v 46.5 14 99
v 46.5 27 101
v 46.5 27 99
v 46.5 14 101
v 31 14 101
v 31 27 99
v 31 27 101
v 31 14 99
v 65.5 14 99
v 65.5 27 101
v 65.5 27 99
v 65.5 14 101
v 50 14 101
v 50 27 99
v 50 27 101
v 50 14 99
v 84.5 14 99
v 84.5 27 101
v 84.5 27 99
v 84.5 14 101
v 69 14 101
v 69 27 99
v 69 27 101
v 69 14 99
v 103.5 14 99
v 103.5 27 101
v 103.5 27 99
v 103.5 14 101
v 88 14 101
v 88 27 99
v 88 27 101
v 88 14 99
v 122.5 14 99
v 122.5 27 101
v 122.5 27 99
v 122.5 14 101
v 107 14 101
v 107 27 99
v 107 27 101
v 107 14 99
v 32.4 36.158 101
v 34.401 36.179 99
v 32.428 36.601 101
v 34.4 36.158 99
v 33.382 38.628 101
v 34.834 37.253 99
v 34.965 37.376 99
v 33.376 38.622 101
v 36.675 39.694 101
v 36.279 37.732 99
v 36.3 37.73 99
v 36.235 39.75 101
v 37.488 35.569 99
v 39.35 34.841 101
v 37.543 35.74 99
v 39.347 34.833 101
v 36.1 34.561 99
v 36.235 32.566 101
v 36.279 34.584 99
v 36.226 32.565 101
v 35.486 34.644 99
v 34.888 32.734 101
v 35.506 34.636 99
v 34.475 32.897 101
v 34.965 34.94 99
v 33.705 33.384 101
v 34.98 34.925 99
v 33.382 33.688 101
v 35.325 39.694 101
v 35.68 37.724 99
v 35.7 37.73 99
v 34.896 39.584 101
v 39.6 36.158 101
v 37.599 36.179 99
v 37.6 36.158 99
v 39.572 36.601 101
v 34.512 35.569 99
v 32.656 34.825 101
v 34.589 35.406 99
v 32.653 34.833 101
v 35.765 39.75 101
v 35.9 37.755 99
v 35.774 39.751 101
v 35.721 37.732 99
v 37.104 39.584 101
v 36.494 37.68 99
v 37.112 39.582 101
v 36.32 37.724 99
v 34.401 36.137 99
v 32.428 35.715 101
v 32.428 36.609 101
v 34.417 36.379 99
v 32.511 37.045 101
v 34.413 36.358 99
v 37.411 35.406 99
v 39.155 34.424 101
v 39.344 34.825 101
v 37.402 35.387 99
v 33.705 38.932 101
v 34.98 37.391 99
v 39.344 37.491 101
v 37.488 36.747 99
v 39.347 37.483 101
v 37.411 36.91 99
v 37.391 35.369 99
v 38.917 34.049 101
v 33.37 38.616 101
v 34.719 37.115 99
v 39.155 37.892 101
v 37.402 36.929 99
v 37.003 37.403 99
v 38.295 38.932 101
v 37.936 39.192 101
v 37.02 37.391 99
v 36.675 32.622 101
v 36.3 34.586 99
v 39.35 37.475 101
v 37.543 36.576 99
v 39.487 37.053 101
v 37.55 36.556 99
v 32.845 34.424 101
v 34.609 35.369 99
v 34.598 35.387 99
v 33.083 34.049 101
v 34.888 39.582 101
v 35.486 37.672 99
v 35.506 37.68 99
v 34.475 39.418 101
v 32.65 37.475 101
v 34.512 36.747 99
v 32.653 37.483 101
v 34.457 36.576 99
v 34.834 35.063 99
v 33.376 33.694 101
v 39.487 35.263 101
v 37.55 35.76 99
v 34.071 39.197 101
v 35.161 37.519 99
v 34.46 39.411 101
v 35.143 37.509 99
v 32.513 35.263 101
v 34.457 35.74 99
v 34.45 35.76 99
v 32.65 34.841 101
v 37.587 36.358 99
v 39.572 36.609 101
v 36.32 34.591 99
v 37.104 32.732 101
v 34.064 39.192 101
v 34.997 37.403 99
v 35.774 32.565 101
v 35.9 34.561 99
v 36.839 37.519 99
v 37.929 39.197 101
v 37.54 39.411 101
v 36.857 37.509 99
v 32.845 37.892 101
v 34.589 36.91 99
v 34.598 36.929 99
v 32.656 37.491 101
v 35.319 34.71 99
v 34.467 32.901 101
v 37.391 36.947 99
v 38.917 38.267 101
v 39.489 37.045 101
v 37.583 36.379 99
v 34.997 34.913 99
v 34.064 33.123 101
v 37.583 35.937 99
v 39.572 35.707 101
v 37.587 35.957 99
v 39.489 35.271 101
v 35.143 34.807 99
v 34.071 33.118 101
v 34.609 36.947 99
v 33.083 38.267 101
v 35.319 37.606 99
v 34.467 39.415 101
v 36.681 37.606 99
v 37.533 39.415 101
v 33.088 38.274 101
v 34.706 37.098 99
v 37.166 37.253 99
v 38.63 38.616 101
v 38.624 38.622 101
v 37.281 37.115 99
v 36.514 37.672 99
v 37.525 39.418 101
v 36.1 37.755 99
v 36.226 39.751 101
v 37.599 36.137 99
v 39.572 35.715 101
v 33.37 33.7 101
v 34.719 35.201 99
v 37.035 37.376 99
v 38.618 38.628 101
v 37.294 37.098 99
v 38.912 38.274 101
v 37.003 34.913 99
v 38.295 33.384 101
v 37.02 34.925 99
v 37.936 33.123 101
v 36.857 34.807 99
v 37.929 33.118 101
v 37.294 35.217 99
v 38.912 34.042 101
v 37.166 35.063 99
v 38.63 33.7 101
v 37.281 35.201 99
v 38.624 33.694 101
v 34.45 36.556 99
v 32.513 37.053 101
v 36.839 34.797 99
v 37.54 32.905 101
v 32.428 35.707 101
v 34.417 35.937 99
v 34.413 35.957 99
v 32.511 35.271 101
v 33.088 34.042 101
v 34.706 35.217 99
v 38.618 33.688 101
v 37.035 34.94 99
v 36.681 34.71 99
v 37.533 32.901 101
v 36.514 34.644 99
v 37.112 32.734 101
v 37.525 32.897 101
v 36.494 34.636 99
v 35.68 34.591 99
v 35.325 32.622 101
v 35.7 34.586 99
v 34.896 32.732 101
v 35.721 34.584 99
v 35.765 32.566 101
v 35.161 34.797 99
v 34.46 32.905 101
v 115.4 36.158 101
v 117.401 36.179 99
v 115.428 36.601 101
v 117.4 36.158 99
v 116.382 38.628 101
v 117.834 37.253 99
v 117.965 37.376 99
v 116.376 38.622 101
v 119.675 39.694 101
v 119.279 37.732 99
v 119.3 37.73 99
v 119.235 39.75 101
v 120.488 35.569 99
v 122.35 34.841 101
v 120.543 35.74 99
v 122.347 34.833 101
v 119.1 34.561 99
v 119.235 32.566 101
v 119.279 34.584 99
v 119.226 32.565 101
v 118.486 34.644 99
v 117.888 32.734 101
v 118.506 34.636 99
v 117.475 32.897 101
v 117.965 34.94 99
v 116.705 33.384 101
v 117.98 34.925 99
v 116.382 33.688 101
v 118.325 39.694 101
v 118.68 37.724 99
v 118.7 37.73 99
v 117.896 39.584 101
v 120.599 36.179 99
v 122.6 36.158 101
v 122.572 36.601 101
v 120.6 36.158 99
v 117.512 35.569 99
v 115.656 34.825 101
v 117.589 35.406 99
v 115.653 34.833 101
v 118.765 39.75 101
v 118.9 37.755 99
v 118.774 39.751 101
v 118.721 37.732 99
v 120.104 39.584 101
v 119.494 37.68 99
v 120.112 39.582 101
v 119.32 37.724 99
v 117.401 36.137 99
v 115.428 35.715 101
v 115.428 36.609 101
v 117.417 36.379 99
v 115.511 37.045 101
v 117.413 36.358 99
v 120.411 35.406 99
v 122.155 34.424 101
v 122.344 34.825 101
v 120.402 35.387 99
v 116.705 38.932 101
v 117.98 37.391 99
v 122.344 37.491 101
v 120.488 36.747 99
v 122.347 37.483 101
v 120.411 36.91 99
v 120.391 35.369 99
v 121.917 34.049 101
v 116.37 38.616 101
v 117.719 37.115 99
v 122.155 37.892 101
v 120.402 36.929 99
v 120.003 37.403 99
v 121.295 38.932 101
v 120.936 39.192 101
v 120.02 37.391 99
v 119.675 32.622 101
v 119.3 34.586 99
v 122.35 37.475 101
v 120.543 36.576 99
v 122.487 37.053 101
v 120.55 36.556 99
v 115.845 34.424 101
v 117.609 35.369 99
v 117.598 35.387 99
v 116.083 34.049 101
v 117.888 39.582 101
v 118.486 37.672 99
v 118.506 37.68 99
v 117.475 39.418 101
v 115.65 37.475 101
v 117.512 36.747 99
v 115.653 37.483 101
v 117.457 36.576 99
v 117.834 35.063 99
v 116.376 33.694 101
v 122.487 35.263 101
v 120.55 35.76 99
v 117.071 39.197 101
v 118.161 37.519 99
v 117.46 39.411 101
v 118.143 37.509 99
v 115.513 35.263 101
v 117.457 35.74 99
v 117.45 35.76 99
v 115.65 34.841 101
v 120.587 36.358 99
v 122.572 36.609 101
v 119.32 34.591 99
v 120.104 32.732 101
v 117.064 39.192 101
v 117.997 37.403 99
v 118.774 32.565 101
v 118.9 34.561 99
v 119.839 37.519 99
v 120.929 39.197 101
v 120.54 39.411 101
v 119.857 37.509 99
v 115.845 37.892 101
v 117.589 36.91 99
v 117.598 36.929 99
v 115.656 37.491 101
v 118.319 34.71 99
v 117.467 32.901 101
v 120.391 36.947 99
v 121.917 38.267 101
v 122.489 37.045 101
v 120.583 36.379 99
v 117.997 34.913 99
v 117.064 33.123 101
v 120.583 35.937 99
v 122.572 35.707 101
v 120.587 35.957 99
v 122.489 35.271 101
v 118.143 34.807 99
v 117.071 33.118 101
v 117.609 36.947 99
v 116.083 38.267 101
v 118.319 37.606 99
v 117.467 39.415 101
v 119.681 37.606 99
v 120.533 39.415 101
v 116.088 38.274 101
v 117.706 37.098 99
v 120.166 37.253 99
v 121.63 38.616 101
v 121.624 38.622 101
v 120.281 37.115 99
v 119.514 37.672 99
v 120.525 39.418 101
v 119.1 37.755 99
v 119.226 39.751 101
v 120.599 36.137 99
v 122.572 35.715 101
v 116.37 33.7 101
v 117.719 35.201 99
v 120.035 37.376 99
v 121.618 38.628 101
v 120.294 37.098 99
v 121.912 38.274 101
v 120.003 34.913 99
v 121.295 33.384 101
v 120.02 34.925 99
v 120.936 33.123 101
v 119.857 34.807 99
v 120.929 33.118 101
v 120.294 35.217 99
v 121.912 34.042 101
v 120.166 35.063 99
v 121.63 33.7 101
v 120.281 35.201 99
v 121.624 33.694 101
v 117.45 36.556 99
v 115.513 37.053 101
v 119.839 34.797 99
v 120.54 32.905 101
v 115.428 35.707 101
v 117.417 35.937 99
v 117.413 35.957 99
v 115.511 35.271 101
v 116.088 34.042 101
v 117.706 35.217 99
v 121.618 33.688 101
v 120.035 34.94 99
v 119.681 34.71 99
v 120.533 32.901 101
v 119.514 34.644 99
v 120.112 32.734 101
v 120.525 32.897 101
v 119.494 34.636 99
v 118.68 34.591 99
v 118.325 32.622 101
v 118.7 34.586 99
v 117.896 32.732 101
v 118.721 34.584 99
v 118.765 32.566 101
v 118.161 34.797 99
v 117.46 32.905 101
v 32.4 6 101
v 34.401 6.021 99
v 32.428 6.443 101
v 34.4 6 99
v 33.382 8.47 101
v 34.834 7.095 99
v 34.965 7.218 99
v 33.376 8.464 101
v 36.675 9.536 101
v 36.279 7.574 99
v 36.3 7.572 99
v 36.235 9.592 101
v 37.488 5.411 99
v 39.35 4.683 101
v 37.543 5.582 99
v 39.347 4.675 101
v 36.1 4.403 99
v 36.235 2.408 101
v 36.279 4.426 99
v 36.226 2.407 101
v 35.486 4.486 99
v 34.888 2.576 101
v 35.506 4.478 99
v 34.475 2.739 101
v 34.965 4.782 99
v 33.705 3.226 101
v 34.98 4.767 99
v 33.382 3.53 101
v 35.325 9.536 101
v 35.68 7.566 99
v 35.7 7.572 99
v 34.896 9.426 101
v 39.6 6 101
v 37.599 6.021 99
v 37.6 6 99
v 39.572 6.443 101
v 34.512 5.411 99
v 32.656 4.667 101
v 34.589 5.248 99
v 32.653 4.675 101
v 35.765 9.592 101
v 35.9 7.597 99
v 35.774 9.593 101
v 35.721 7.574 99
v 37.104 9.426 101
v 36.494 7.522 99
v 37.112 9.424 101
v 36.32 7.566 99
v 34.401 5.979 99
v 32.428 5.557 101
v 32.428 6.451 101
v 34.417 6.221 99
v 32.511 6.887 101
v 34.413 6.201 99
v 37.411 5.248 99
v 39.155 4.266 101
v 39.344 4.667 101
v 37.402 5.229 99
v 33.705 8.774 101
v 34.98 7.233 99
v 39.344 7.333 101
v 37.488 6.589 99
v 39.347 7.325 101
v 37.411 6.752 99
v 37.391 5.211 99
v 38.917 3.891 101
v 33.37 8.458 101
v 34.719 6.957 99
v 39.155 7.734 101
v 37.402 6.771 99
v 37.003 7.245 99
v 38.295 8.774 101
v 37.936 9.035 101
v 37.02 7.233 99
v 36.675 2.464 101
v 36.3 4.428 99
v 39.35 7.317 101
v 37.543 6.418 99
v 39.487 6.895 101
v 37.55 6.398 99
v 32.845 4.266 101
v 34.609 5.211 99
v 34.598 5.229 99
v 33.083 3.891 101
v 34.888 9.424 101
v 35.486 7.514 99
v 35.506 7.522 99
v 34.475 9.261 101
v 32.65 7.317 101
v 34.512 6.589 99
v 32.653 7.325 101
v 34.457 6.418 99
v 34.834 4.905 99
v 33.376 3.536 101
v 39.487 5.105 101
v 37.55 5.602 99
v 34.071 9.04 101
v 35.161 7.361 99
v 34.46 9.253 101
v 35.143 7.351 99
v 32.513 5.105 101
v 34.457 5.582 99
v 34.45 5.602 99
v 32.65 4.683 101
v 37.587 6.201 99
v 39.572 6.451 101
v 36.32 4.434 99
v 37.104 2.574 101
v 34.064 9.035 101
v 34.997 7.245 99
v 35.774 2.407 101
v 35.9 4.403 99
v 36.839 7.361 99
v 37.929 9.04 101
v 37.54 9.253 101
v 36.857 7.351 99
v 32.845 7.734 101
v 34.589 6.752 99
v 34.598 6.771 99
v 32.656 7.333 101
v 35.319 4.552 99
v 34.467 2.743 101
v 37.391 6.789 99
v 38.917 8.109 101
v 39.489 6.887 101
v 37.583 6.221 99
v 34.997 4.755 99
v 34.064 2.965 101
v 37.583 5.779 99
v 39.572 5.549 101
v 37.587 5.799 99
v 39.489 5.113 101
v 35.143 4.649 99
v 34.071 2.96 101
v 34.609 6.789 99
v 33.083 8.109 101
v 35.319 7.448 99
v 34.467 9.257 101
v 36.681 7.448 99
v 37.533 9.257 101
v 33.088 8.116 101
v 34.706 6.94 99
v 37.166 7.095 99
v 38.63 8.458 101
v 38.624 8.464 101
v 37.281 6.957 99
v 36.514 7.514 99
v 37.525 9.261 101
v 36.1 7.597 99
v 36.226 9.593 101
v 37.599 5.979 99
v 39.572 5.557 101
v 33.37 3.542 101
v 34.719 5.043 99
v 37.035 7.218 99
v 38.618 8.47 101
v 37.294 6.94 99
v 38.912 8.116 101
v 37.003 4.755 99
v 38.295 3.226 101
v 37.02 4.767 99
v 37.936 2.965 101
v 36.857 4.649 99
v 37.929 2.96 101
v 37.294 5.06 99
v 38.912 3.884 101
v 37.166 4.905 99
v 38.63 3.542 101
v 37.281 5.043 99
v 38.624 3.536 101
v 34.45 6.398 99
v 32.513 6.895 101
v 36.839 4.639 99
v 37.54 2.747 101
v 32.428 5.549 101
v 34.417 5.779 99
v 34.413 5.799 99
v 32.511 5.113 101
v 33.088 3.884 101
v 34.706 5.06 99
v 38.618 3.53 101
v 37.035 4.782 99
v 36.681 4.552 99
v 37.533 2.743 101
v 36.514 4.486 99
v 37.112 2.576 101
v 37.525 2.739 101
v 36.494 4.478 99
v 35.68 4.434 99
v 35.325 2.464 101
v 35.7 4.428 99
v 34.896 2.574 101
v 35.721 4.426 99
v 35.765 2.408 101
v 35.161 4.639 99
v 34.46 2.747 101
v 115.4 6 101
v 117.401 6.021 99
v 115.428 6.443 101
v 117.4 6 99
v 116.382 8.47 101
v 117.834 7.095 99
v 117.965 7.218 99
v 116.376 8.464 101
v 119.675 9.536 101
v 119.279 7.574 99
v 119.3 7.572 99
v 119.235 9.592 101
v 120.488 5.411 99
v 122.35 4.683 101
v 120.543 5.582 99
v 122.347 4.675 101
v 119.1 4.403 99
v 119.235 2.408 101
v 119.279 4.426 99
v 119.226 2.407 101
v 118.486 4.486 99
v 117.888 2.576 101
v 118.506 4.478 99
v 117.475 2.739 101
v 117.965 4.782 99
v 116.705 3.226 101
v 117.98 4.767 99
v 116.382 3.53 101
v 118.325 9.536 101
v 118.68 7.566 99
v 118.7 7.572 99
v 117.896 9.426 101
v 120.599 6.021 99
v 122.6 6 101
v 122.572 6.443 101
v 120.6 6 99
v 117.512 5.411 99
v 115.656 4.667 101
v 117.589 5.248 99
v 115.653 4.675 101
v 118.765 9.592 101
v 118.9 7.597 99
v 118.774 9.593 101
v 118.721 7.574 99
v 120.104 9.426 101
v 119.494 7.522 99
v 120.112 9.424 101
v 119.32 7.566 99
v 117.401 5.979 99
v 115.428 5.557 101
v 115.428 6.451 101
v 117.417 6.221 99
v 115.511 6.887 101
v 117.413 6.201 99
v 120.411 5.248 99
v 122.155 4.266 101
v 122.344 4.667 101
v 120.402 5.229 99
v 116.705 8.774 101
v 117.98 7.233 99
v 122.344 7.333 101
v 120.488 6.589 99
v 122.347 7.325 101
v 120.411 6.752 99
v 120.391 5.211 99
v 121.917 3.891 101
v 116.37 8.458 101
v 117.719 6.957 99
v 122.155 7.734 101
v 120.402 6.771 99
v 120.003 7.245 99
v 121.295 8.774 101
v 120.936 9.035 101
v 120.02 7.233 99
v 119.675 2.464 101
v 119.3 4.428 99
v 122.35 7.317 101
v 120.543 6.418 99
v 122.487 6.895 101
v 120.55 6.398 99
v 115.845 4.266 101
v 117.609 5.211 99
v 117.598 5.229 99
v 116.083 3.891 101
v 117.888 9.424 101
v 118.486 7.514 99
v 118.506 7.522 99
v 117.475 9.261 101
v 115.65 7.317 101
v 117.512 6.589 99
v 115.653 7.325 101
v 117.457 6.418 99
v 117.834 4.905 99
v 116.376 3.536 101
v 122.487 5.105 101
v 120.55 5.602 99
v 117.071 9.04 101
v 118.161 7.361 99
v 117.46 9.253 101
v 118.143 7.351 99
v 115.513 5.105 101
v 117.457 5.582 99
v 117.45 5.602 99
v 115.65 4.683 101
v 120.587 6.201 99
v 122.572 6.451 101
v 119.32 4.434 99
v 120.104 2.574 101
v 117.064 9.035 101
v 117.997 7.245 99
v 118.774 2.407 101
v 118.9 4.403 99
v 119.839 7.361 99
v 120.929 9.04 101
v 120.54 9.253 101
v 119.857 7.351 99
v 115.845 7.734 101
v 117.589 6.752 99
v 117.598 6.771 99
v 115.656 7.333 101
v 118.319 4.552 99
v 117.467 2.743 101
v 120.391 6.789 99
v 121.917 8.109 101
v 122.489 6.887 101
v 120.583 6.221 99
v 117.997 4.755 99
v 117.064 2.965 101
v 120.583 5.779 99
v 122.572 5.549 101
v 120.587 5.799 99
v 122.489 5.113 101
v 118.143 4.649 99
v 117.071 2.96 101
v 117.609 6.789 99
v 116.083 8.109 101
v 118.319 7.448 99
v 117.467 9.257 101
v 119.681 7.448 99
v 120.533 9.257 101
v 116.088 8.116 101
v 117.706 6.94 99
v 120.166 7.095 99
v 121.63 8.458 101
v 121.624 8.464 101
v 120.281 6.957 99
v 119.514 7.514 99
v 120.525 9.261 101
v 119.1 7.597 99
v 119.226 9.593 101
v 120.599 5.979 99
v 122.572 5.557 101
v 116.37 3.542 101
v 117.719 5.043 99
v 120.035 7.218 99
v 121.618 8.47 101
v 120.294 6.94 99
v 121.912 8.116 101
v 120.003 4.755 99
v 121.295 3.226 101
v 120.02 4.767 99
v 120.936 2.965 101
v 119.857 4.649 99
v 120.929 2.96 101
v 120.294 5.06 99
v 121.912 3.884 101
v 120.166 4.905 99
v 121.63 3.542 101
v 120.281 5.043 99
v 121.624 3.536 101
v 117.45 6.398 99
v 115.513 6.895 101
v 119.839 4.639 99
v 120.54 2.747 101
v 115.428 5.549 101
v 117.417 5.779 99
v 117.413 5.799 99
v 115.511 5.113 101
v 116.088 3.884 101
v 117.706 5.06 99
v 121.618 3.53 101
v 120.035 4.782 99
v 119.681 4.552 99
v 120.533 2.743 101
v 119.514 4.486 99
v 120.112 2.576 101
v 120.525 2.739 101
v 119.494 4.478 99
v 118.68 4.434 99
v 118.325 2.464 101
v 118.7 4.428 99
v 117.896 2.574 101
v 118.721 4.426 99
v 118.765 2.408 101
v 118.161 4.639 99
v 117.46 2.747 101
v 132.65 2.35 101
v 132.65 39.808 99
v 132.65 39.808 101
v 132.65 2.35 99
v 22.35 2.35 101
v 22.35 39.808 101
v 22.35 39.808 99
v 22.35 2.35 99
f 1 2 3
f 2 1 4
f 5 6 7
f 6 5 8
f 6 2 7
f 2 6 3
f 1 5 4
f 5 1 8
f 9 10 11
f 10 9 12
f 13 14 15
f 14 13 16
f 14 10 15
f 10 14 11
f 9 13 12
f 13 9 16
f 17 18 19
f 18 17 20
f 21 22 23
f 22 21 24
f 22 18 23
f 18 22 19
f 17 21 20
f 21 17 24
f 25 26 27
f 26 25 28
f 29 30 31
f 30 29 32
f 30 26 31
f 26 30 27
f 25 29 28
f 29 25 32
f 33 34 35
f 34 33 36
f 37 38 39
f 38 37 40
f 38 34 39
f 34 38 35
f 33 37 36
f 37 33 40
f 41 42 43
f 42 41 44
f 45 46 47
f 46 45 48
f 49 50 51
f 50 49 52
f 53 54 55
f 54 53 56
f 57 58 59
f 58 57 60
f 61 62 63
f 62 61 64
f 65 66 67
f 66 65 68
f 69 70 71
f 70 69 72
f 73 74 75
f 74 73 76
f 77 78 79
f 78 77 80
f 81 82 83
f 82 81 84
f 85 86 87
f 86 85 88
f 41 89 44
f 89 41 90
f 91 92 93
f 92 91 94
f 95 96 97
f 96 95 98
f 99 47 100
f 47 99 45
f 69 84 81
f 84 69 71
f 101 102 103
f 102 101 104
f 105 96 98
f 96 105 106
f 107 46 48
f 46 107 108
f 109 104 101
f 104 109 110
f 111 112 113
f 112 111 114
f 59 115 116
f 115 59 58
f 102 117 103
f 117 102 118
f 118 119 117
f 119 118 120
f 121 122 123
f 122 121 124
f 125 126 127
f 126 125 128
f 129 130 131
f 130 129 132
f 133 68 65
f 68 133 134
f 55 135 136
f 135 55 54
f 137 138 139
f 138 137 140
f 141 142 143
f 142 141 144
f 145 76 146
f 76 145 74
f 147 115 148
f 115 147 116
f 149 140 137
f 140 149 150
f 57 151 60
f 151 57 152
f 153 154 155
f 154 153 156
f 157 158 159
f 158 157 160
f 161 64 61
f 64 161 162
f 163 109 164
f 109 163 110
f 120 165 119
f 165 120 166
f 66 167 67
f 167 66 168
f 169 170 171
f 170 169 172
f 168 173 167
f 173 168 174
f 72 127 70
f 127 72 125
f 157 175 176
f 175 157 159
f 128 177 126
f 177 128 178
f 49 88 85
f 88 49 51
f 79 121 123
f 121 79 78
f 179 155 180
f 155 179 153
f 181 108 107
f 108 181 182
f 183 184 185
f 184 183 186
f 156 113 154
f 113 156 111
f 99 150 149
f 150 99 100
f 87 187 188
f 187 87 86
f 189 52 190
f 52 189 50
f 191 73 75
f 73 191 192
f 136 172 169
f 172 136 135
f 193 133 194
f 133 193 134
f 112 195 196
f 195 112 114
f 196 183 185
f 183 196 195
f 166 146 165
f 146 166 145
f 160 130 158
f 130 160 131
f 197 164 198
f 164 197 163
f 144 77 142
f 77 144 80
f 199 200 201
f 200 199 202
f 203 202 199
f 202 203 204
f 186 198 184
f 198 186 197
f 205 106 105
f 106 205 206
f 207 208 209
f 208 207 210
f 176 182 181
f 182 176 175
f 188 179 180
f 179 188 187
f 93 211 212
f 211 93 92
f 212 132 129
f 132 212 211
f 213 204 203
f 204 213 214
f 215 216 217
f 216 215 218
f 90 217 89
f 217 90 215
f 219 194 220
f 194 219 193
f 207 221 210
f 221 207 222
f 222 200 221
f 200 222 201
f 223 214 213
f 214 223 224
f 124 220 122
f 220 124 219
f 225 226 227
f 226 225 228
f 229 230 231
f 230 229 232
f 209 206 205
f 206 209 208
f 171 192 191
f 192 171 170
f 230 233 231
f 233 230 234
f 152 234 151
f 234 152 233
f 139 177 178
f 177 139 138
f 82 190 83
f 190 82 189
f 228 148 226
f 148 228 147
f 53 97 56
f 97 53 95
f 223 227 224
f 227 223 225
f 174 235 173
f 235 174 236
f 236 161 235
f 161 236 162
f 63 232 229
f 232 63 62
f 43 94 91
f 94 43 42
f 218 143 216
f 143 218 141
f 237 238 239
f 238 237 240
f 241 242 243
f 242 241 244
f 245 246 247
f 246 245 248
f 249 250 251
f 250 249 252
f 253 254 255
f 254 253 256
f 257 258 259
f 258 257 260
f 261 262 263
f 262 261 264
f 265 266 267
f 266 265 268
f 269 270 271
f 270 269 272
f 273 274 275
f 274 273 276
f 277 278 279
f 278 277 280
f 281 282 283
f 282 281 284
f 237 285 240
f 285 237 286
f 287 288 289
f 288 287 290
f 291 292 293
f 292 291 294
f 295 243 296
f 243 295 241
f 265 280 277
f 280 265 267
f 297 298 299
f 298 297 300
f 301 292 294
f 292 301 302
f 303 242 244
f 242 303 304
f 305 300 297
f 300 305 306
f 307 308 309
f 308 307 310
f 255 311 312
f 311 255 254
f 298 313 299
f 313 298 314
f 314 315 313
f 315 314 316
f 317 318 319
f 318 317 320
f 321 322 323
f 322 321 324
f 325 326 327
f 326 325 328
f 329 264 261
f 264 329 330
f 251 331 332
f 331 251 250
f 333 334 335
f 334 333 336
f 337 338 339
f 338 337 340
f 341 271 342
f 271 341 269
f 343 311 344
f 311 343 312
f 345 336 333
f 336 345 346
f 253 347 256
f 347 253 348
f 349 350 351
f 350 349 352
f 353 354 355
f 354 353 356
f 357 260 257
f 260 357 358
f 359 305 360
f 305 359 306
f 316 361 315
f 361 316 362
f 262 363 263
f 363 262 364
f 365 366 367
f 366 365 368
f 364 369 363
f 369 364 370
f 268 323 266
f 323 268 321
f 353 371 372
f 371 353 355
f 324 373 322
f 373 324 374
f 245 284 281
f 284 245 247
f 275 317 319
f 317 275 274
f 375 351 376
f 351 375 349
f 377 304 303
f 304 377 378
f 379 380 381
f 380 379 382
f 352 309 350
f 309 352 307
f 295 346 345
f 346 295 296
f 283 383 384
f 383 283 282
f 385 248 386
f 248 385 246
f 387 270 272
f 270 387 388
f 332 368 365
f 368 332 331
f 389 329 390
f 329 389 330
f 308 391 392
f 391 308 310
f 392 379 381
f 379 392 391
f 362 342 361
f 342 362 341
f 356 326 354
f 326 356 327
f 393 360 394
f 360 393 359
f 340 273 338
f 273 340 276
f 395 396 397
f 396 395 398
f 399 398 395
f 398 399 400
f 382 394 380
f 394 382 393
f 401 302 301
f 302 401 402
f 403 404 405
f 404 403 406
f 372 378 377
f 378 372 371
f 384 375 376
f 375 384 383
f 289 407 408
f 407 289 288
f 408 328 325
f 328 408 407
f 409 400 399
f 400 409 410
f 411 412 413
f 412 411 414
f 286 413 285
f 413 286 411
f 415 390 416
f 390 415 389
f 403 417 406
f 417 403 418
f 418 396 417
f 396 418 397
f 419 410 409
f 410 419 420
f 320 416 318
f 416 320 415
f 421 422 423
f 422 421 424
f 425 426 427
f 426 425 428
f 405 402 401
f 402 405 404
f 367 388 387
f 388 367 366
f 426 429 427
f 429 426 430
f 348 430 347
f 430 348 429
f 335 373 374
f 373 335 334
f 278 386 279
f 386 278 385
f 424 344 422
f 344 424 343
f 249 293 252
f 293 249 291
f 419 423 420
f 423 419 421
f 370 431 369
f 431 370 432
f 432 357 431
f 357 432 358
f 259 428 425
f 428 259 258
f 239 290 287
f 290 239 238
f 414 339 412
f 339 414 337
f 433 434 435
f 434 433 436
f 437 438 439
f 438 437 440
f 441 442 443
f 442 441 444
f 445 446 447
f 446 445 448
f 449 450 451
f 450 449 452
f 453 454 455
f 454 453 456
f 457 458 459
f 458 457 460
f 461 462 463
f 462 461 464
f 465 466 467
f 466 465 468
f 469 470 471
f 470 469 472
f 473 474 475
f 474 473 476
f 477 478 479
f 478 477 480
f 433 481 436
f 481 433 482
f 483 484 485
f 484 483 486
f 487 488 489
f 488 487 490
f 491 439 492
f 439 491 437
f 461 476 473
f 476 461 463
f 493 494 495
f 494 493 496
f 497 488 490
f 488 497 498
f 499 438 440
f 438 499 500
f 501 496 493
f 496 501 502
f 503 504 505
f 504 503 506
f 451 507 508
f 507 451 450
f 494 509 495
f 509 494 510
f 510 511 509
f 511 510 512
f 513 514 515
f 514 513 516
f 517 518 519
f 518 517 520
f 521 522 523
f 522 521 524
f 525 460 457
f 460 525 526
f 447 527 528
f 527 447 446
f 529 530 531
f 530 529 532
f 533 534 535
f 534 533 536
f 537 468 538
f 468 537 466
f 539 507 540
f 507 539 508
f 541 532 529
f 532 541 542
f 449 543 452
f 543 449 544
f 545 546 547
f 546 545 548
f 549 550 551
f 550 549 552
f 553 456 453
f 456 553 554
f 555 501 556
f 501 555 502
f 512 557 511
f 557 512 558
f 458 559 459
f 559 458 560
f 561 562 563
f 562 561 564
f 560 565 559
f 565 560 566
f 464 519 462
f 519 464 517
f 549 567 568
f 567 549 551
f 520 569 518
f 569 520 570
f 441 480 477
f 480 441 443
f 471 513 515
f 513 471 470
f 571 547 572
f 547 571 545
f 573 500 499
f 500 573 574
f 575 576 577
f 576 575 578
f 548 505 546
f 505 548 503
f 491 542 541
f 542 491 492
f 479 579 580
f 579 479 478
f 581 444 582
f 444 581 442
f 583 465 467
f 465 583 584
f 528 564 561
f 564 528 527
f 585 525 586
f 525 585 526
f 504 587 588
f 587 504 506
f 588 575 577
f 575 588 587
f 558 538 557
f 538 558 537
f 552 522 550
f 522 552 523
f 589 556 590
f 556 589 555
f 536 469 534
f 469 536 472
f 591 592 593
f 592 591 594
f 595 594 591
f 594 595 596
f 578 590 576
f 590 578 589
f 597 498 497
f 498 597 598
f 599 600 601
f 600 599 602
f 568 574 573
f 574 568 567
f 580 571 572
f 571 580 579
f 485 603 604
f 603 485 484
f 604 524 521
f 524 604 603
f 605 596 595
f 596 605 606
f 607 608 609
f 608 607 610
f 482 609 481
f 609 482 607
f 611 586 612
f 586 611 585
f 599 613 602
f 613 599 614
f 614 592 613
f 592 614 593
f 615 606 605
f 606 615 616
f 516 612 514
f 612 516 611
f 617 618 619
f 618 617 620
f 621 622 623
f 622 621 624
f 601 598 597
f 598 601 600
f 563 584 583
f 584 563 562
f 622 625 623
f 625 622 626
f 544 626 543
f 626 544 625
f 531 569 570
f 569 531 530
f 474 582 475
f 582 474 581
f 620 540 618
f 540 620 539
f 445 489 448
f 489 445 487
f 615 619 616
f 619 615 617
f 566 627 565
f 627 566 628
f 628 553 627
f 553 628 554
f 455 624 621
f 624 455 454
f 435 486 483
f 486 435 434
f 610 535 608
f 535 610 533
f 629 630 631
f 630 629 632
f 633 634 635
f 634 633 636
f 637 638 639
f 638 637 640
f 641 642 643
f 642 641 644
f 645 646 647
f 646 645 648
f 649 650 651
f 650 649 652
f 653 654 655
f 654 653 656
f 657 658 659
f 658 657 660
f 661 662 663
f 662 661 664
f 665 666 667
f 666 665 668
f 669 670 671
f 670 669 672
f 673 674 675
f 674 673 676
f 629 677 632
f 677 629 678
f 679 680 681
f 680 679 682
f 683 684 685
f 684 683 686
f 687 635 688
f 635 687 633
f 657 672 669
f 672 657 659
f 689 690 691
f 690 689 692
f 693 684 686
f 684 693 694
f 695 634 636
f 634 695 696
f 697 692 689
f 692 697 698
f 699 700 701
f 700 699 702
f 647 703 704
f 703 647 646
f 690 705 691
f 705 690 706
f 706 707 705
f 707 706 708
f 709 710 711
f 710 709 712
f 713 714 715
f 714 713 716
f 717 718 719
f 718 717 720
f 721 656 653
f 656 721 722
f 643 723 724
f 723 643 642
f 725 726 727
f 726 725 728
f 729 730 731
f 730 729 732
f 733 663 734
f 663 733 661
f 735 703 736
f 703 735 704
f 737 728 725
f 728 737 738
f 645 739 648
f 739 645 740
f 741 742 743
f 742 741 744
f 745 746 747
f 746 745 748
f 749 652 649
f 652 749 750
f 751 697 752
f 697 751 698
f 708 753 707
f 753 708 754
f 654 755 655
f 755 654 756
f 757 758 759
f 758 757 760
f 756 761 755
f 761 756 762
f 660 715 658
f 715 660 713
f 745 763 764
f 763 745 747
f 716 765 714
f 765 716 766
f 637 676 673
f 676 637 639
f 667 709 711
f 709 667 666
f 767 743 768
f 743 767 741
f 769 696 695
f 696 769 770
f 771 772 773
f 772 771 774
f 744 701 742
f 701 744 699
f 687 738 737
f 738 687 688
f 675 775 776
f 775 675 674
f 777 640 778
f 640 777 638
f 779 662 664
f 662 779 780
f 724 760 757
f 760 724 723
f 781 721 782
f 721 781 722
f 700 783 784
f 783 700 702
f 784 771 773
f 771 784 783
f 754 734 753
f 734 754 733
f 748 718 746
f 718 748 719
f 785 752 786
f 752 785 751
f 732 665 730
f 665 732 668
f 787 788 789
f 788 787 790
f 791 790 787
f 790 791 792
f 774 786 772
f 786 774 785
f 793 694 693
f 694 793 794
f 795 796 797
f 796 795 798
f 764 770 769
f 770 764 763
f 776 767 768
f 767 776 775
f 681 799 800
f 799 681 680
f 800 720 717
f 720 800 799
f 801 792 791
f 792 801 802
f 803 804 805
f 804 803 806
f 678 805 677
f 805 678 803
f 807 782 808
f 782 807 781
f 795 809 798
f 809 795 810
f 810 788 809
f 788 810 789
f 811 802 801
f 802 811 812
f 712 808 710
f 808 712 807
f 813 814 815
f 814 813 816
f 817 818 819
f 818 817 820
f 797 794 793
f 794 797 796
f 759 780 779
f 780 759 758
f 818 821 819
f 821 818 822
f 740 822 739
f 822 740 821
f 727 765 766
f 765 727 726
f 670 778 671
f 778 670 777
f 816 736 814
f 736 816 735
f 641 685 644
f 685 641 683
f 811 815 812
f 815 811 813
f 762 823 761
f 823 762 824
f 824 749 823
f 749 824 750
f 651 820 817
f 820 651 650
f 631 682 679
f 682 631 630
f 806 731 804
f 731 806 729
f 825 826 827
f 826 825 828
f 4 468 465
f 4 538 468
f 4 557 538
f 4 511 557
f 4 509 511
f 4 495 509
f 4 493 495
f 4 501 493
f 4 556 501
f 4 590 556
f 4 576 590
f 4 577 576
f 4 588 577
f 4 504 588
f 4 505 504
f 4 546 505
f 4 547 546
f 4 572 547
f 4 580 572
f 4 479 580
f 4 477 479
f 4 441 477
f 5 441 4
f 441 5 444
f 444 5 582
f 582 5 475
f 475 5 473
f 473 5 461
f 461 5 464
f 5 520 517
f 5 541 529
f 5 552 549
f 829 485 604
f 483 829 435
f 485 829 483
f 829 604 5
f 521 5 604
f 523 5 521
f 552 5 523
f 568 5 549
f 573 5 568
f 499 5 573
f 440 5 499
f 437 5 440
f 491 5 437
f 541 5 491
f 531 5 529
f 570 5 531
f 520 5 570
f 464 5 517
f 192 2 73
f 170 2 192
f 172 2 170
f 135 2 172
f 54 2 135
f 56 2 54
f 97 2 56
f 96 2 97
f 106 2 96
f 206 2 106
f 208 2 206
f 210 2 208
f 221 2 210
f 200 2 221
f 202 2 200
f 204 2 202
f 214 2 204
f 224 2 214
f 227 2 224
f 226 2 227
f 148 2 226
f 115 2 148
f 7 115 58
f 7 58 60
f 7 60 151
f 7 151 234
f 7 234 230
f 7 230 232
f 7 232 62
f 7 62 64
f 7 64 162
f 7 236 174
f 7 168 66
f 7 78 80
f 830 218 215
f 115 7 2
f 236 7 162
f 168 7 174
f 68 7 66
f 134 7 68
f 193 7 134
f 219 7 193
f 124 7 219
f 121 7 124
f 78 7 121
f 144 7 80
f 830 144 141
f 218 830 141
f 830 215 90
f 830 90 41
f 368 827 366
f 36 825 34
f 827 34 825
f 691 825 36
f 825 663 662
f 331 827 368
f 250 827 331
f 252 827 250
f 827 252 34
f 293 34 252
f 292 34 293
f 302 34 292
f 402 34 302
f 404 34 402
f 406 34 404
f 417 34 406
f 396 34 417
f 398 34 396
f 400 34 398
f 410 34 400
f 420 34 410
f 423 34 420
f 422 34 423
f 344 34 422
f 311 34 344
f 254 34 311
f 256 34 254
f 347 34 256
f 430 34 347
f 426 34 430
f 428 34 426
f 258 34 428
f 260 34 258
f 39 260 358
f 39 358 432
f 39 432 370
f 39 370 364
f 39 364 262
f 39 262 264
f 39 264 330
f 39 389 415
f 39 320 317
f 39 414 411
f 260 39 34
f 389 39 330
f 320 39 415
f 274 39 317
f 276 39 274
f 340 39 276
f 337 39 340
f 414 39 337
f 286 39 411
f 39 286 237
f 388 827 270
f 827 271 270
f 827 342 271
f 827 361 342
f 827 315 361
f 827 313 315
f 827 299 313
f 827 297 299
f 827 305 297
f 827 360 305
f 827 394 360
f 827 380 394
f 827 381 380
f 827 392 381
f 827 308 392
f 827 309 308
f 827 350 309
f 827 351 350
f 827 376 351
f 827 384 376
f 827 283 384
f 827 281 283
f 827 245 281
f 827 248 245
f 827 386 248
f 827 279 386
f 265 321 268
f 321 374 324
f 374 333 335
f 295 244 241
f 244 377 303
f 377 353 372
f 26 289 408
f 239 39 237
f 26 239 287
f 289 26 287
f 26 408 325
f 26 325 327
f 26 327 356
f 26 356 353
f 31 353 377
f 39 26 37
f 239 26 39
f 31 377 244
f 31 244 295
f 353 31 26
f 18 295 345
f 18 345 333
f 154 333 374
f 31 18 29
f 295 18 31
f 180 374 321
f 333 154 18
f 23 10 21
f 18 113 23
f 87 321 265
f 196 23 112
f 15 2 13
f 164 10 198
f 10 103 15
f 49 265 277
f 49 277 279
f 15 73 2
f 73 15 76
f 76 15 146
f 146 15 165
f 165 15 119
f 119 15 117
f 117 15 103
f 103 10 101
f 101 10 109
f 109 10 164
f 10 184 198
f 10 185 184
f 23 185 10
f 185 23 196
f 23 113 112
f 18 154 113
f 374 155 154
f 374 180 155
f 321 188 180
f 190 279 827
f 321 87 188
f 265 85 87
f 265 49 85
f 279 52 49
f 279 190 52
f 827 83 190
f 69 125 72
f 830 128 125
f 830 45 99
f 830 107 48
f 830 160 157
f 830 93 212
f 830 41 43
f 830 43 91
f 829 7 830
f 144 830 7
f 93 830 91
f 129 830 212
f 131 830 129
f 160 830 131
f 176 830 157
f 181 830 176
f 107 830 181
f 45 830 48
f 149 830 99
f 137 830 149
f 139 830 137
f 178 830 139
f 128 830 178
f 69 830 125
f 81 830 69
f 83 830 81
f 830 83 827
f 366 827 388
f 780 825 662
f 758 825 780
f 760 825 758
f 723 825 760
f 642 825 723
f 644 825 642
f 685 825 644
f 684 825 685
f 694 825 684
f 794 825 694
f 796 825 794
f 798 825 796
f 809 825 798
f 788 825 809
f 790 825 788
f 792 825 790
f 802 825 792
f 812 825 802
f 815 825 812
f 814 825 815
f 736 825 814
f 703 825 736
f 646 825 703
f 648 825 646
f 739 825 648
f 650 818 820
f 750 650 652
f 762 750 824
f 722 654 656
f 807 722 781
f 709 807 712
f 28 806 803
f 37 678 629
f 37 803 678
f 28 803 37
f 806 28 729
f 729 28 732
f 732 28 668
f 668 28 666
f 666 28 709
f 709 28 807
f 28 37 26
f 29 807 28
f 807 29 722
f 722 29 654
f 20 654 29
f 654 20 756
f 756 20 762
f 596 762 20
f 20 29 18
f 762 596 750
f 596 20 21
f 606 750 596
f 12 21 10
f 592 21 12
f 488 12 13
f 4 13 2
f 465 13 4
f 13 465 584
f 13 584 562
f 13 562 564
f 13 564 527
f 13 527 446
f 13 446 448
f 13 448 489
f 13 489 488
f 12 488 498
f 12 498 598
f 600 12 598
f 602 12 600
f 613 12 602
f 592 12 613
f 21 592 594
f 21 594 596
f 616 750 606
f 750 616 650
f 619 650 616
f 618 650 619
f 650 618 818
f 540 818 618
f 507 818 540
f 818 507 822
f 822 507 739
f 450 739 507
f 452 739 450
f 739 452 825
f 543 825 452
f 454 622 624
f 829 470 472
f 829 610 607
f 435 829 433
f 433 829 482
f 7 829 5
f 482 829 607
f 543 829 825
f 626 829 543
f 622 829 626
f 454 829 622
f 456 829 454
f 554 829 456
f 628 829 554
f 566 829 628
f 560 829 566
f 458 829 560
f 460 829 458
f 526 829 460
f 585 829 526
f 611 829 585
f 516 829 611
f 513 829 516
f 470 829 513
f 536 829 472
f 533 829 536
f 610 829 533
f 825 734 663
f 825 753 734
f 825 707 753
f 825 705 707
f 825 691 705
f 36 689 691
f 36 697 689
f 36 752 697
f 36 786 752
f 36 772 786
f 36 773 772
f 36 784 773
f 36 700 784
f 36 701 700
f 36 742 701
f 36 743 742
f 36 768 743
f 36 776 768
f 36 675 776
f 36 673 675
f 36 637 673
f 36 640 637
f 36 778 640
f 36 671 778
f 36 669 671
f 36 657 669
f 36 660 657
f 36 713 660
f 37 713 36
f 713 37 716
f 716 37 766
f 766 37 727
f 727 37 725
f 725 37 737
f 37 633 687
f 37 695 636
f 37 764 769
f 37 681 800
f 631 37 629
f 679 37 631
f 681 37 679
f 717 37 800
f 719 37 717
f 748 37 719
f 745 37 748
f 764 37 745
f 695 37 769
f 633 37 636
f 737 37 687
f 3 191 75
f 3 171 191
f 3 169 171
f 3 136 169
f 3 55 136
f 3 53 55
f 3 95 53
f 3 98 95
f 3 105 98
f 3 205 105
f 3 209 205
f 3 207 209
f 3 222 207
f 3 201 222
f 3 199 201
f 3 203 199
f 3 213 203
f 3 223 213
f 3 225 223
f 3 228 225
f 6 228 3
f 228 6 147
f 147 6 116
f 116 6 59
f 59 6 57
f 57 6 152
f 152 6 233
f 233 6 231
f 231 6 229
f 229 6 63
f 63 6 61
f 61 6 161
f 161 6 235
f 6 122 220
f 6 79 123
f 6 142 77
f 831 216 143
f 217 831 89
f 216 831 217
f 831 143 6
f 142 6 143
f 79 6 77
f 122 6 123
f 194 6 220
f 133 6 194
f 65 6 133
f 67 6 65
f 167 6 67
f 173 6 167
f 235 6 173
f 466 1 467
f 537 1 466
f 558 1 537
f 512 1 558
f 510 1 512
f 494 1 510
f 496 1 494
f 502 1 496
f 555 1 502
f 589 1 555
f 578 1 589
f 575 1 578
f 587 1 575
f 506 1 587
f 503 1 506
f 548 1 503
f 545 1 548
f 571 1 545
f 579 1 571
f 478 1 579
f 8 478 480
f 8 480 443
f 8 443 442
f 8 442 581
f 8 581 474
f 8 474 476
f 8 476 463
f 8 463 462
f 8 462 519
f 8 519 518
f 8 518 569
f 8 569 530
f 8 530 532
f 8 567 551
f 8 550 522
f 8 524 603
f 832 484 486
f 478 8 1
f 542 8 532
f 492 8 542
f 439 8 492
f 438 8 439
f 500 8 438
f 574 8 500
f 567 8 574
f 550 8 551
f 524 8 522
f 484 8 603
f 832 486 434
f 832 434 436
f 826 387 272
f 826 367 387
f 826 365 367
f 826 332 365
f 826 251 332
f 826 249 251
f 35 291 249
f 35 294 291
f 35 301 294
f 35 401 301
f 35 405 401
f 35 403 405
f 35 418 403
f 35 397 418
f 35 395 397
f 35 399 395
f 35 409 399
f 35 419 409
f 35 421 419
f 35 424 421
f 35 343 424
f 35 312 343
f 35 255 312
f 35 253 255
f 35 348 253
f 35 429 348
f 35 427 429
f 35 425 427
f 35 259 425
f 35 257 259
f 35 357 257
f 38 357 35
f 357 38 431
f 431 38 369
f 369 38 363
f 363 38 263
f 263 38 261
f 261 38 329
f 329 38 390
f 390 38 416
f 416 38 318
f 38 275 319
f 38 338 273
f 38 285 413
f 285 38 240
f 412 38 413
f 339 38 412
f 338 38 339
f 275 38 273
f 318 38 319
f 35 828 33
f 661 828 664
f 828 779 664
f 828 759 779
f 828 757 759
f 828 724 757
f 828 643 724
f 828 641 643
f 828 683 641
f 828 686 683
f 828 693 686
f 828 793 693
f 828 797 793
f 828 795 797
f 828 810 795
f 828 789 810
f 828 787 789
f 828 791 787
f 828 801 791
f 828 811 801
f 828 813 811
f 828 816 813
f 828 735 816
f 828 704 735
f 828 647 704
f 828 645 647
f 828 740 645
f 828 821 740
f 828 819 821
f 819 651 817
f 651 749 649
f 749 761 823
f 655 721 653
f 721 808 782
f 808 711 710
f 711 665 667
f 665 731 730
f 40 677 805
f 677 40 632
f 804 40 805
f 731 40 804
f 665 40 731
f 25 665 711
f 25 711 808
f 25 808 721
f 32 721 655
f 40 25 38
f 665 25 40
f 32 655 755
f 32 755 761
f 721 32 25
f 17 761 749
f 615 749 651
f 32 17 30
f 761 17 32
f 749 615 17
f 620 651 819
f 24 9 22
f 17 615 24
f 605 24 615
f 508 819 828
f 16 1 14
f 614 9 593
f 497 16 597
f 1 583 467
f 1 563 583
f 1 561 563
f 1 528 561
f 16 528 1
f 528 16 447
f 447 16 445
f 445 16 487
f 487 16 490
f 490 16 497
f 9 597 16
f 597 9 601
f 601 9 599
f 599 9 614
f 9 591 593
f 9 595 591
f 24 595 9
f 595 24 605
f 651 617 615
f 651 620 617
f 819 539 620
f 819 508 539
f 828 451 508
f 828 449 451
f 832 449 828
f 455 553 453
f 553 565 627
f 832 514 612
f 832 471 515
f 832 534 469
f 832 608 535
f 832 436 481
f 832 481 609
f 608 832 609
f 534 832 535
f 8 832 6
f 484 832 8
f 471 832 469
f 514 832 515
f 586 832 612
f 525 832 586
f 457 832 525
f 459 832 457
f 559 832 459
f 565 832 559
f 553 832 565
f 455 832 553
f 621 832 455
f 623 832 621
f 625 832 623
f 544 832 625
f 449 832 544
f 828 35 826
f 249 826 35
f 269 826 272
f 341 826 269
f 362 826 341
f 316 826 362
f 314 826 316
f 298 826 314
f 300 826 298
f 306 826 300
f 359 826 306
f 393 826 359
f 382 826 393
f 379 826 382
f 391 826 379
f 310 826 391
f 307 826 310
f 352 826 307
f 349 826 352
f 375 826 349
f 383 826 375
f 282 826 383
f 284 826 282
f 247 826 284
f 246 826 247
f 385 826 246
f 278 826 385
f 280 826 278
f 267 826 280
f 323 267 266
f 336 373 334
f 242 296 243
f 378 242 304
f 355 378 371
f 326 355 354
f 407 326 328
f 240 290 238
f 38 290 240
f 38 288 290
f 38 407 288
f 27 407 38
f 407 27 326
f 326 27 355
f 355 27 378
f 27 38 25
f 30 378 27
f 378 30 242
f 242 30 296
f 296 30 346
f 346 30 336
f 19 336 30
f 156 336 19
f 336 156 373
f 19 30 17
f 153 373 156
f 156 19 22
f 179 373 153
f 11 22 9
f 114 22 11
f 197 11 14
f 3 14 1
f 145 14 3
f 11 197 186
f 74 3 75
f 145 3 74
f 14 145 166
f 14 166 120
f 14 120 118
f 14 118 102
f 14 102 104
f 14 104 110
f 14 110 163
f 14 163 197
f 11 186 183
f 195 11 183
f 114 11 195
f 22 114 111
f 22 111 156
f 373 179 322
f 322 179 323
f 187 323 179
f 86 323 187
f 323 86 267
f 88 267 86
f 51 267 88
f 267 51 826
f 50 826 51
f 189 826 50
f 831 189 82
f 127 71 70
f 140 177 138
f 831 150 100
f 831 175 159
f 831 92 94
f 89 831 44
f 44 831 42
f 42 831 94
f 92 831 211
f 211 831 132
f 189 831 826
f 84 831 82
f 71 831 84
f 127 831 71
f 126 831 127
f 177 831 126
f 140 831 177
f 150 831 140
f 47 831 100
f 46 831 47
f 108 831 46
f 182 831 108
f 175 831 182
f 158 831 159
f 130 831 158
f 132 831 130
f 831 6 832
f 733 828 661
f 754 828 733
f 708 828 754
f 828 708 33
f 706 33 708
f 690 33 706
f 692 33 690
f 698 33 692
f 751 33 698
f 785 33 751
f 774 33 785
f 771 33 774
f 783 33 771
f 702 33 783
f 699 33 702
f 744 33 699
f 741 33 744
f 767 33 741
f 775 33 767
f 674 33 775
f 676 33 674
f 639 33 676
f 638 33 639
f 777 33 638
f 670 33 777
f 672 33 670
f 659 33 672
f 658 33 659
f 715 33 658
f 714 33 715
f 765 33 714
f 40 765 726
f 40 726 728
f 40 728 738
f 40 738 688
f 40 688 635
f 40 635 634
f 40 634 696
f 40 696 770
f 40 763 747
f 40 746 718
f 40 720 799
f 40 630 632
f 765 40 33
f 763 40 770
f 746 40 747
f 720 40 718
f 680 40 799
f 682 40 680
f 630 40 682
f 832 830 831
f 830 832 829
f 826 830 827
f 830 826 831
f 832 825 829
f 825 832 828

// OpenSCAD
include<../sixinch_library.scad>


  ///////////////////////////////
 // Edgerouter X              //
///////////////////////////////

print_frontplate_sml = false;
print_handle_sml     = false;
print_cabinet_sml    = false;
print_lid            = false;
print_rear           = true;
model                = false;

units = 3;
depth = 98;

module model() {
    rotate([-90,0,0]){
        translate([22, -99, 8])
          difference(){
            union(){
             color([1,1,1]) cube([110, 75, 22]);    // EdgeRouter X model
            }
            translate([9, -1, 6]) 
                color([0.5, 0.5, 0.5]) 
                    union() { // RJ45 ports
                        translate([0* (15.5 + 3.5), 0, 0]) cube([15.5, 16, 13]);
                        translate([1* (15.5 + 3.5), 0, 0]) cube([15.5, 16, 13]);
                        translate([2* (15.5 + 3.5), 0, 0]) cube([15.5, 16, 13]);
                        translate([3* (15.5 + 3.5), 0, 0]) cube([15.5, 16, 13]);
                        translate([4* (15.5 + 3.5), 0, 0]) cube([15.5, 16, 13]);
                    }
          }
      }
}

if(print_frontplate_sml){ // Frontplate //
    square_hole        = [];
    round_hole         = [];
    round_peg          = [];   
    screw_side_front   = [];
    screw_top          = [36];
    screw_bottom_front = [36];
    frontplate(units,square_hole,round_hole,round_peg,screw_side_front,screw_top,screw_bottom_front);

}

if(print_handle_sml){ // Handle // 
    lay_flat_for_print = false;   
    handle(units,lay_flat_for_print);
}

if(print_cabinet_sml){ // Cabinet //  
    w=88;
    h=70;
    screw_bottom_front = [36];
    screw_side_front   = [];
    round_peg          = [
        [20,  20, 15, 0, 15],  // Pillar in front
        [90,  20, 15, 0, 15],  // Pillar in front
                              
        [5,   80, 10, 0, 15],  // Pillar to the near right
    
        [105, 80, 10, 0, 15],  // Pillar to the near left
    
        [55,  50, 45, 0,  8],  // Pillar under the switch
    
    ];
    difference() {
        cabinet(depth,units,screw_bottom_front,round_peg,screw_side_front);
        model();
    }
}

if(print_lid){ // Lid // 
    screw_front = [36];//mm
    screw_back  = [36];//mm
    difference () {
        lid(depth, units, screw_front, screw_back);        
        model();
    }
}

if(print_rear){  // Back plate //    
    square_hole  = [
        [9 + 0 * (15.5 + 3.5), 12, 15.5, 13],
        [9 + 1 * (15.5 + 3.5), 12, 15.5, 13],
        [9 + 2 * (15.5 + 3.5), 12, 15.5, 13],
        [9 + 3 * (15.5 + 3.5), 12, 15.5, 13],
        [9 + 4 * (15.5 + 3.5), 12, 15.5, 13],
    ];
    round_hole   = [];
    screw_top    = [36];//mm
    screw_bottom = [36];//mm
    screw_side   = [];
    back_plate(units, depth, screw_top, screw_bottom, screw_side, square_hole,round_hole);
}  


// EdgeRouter X model
if(model) {
  model();
}
